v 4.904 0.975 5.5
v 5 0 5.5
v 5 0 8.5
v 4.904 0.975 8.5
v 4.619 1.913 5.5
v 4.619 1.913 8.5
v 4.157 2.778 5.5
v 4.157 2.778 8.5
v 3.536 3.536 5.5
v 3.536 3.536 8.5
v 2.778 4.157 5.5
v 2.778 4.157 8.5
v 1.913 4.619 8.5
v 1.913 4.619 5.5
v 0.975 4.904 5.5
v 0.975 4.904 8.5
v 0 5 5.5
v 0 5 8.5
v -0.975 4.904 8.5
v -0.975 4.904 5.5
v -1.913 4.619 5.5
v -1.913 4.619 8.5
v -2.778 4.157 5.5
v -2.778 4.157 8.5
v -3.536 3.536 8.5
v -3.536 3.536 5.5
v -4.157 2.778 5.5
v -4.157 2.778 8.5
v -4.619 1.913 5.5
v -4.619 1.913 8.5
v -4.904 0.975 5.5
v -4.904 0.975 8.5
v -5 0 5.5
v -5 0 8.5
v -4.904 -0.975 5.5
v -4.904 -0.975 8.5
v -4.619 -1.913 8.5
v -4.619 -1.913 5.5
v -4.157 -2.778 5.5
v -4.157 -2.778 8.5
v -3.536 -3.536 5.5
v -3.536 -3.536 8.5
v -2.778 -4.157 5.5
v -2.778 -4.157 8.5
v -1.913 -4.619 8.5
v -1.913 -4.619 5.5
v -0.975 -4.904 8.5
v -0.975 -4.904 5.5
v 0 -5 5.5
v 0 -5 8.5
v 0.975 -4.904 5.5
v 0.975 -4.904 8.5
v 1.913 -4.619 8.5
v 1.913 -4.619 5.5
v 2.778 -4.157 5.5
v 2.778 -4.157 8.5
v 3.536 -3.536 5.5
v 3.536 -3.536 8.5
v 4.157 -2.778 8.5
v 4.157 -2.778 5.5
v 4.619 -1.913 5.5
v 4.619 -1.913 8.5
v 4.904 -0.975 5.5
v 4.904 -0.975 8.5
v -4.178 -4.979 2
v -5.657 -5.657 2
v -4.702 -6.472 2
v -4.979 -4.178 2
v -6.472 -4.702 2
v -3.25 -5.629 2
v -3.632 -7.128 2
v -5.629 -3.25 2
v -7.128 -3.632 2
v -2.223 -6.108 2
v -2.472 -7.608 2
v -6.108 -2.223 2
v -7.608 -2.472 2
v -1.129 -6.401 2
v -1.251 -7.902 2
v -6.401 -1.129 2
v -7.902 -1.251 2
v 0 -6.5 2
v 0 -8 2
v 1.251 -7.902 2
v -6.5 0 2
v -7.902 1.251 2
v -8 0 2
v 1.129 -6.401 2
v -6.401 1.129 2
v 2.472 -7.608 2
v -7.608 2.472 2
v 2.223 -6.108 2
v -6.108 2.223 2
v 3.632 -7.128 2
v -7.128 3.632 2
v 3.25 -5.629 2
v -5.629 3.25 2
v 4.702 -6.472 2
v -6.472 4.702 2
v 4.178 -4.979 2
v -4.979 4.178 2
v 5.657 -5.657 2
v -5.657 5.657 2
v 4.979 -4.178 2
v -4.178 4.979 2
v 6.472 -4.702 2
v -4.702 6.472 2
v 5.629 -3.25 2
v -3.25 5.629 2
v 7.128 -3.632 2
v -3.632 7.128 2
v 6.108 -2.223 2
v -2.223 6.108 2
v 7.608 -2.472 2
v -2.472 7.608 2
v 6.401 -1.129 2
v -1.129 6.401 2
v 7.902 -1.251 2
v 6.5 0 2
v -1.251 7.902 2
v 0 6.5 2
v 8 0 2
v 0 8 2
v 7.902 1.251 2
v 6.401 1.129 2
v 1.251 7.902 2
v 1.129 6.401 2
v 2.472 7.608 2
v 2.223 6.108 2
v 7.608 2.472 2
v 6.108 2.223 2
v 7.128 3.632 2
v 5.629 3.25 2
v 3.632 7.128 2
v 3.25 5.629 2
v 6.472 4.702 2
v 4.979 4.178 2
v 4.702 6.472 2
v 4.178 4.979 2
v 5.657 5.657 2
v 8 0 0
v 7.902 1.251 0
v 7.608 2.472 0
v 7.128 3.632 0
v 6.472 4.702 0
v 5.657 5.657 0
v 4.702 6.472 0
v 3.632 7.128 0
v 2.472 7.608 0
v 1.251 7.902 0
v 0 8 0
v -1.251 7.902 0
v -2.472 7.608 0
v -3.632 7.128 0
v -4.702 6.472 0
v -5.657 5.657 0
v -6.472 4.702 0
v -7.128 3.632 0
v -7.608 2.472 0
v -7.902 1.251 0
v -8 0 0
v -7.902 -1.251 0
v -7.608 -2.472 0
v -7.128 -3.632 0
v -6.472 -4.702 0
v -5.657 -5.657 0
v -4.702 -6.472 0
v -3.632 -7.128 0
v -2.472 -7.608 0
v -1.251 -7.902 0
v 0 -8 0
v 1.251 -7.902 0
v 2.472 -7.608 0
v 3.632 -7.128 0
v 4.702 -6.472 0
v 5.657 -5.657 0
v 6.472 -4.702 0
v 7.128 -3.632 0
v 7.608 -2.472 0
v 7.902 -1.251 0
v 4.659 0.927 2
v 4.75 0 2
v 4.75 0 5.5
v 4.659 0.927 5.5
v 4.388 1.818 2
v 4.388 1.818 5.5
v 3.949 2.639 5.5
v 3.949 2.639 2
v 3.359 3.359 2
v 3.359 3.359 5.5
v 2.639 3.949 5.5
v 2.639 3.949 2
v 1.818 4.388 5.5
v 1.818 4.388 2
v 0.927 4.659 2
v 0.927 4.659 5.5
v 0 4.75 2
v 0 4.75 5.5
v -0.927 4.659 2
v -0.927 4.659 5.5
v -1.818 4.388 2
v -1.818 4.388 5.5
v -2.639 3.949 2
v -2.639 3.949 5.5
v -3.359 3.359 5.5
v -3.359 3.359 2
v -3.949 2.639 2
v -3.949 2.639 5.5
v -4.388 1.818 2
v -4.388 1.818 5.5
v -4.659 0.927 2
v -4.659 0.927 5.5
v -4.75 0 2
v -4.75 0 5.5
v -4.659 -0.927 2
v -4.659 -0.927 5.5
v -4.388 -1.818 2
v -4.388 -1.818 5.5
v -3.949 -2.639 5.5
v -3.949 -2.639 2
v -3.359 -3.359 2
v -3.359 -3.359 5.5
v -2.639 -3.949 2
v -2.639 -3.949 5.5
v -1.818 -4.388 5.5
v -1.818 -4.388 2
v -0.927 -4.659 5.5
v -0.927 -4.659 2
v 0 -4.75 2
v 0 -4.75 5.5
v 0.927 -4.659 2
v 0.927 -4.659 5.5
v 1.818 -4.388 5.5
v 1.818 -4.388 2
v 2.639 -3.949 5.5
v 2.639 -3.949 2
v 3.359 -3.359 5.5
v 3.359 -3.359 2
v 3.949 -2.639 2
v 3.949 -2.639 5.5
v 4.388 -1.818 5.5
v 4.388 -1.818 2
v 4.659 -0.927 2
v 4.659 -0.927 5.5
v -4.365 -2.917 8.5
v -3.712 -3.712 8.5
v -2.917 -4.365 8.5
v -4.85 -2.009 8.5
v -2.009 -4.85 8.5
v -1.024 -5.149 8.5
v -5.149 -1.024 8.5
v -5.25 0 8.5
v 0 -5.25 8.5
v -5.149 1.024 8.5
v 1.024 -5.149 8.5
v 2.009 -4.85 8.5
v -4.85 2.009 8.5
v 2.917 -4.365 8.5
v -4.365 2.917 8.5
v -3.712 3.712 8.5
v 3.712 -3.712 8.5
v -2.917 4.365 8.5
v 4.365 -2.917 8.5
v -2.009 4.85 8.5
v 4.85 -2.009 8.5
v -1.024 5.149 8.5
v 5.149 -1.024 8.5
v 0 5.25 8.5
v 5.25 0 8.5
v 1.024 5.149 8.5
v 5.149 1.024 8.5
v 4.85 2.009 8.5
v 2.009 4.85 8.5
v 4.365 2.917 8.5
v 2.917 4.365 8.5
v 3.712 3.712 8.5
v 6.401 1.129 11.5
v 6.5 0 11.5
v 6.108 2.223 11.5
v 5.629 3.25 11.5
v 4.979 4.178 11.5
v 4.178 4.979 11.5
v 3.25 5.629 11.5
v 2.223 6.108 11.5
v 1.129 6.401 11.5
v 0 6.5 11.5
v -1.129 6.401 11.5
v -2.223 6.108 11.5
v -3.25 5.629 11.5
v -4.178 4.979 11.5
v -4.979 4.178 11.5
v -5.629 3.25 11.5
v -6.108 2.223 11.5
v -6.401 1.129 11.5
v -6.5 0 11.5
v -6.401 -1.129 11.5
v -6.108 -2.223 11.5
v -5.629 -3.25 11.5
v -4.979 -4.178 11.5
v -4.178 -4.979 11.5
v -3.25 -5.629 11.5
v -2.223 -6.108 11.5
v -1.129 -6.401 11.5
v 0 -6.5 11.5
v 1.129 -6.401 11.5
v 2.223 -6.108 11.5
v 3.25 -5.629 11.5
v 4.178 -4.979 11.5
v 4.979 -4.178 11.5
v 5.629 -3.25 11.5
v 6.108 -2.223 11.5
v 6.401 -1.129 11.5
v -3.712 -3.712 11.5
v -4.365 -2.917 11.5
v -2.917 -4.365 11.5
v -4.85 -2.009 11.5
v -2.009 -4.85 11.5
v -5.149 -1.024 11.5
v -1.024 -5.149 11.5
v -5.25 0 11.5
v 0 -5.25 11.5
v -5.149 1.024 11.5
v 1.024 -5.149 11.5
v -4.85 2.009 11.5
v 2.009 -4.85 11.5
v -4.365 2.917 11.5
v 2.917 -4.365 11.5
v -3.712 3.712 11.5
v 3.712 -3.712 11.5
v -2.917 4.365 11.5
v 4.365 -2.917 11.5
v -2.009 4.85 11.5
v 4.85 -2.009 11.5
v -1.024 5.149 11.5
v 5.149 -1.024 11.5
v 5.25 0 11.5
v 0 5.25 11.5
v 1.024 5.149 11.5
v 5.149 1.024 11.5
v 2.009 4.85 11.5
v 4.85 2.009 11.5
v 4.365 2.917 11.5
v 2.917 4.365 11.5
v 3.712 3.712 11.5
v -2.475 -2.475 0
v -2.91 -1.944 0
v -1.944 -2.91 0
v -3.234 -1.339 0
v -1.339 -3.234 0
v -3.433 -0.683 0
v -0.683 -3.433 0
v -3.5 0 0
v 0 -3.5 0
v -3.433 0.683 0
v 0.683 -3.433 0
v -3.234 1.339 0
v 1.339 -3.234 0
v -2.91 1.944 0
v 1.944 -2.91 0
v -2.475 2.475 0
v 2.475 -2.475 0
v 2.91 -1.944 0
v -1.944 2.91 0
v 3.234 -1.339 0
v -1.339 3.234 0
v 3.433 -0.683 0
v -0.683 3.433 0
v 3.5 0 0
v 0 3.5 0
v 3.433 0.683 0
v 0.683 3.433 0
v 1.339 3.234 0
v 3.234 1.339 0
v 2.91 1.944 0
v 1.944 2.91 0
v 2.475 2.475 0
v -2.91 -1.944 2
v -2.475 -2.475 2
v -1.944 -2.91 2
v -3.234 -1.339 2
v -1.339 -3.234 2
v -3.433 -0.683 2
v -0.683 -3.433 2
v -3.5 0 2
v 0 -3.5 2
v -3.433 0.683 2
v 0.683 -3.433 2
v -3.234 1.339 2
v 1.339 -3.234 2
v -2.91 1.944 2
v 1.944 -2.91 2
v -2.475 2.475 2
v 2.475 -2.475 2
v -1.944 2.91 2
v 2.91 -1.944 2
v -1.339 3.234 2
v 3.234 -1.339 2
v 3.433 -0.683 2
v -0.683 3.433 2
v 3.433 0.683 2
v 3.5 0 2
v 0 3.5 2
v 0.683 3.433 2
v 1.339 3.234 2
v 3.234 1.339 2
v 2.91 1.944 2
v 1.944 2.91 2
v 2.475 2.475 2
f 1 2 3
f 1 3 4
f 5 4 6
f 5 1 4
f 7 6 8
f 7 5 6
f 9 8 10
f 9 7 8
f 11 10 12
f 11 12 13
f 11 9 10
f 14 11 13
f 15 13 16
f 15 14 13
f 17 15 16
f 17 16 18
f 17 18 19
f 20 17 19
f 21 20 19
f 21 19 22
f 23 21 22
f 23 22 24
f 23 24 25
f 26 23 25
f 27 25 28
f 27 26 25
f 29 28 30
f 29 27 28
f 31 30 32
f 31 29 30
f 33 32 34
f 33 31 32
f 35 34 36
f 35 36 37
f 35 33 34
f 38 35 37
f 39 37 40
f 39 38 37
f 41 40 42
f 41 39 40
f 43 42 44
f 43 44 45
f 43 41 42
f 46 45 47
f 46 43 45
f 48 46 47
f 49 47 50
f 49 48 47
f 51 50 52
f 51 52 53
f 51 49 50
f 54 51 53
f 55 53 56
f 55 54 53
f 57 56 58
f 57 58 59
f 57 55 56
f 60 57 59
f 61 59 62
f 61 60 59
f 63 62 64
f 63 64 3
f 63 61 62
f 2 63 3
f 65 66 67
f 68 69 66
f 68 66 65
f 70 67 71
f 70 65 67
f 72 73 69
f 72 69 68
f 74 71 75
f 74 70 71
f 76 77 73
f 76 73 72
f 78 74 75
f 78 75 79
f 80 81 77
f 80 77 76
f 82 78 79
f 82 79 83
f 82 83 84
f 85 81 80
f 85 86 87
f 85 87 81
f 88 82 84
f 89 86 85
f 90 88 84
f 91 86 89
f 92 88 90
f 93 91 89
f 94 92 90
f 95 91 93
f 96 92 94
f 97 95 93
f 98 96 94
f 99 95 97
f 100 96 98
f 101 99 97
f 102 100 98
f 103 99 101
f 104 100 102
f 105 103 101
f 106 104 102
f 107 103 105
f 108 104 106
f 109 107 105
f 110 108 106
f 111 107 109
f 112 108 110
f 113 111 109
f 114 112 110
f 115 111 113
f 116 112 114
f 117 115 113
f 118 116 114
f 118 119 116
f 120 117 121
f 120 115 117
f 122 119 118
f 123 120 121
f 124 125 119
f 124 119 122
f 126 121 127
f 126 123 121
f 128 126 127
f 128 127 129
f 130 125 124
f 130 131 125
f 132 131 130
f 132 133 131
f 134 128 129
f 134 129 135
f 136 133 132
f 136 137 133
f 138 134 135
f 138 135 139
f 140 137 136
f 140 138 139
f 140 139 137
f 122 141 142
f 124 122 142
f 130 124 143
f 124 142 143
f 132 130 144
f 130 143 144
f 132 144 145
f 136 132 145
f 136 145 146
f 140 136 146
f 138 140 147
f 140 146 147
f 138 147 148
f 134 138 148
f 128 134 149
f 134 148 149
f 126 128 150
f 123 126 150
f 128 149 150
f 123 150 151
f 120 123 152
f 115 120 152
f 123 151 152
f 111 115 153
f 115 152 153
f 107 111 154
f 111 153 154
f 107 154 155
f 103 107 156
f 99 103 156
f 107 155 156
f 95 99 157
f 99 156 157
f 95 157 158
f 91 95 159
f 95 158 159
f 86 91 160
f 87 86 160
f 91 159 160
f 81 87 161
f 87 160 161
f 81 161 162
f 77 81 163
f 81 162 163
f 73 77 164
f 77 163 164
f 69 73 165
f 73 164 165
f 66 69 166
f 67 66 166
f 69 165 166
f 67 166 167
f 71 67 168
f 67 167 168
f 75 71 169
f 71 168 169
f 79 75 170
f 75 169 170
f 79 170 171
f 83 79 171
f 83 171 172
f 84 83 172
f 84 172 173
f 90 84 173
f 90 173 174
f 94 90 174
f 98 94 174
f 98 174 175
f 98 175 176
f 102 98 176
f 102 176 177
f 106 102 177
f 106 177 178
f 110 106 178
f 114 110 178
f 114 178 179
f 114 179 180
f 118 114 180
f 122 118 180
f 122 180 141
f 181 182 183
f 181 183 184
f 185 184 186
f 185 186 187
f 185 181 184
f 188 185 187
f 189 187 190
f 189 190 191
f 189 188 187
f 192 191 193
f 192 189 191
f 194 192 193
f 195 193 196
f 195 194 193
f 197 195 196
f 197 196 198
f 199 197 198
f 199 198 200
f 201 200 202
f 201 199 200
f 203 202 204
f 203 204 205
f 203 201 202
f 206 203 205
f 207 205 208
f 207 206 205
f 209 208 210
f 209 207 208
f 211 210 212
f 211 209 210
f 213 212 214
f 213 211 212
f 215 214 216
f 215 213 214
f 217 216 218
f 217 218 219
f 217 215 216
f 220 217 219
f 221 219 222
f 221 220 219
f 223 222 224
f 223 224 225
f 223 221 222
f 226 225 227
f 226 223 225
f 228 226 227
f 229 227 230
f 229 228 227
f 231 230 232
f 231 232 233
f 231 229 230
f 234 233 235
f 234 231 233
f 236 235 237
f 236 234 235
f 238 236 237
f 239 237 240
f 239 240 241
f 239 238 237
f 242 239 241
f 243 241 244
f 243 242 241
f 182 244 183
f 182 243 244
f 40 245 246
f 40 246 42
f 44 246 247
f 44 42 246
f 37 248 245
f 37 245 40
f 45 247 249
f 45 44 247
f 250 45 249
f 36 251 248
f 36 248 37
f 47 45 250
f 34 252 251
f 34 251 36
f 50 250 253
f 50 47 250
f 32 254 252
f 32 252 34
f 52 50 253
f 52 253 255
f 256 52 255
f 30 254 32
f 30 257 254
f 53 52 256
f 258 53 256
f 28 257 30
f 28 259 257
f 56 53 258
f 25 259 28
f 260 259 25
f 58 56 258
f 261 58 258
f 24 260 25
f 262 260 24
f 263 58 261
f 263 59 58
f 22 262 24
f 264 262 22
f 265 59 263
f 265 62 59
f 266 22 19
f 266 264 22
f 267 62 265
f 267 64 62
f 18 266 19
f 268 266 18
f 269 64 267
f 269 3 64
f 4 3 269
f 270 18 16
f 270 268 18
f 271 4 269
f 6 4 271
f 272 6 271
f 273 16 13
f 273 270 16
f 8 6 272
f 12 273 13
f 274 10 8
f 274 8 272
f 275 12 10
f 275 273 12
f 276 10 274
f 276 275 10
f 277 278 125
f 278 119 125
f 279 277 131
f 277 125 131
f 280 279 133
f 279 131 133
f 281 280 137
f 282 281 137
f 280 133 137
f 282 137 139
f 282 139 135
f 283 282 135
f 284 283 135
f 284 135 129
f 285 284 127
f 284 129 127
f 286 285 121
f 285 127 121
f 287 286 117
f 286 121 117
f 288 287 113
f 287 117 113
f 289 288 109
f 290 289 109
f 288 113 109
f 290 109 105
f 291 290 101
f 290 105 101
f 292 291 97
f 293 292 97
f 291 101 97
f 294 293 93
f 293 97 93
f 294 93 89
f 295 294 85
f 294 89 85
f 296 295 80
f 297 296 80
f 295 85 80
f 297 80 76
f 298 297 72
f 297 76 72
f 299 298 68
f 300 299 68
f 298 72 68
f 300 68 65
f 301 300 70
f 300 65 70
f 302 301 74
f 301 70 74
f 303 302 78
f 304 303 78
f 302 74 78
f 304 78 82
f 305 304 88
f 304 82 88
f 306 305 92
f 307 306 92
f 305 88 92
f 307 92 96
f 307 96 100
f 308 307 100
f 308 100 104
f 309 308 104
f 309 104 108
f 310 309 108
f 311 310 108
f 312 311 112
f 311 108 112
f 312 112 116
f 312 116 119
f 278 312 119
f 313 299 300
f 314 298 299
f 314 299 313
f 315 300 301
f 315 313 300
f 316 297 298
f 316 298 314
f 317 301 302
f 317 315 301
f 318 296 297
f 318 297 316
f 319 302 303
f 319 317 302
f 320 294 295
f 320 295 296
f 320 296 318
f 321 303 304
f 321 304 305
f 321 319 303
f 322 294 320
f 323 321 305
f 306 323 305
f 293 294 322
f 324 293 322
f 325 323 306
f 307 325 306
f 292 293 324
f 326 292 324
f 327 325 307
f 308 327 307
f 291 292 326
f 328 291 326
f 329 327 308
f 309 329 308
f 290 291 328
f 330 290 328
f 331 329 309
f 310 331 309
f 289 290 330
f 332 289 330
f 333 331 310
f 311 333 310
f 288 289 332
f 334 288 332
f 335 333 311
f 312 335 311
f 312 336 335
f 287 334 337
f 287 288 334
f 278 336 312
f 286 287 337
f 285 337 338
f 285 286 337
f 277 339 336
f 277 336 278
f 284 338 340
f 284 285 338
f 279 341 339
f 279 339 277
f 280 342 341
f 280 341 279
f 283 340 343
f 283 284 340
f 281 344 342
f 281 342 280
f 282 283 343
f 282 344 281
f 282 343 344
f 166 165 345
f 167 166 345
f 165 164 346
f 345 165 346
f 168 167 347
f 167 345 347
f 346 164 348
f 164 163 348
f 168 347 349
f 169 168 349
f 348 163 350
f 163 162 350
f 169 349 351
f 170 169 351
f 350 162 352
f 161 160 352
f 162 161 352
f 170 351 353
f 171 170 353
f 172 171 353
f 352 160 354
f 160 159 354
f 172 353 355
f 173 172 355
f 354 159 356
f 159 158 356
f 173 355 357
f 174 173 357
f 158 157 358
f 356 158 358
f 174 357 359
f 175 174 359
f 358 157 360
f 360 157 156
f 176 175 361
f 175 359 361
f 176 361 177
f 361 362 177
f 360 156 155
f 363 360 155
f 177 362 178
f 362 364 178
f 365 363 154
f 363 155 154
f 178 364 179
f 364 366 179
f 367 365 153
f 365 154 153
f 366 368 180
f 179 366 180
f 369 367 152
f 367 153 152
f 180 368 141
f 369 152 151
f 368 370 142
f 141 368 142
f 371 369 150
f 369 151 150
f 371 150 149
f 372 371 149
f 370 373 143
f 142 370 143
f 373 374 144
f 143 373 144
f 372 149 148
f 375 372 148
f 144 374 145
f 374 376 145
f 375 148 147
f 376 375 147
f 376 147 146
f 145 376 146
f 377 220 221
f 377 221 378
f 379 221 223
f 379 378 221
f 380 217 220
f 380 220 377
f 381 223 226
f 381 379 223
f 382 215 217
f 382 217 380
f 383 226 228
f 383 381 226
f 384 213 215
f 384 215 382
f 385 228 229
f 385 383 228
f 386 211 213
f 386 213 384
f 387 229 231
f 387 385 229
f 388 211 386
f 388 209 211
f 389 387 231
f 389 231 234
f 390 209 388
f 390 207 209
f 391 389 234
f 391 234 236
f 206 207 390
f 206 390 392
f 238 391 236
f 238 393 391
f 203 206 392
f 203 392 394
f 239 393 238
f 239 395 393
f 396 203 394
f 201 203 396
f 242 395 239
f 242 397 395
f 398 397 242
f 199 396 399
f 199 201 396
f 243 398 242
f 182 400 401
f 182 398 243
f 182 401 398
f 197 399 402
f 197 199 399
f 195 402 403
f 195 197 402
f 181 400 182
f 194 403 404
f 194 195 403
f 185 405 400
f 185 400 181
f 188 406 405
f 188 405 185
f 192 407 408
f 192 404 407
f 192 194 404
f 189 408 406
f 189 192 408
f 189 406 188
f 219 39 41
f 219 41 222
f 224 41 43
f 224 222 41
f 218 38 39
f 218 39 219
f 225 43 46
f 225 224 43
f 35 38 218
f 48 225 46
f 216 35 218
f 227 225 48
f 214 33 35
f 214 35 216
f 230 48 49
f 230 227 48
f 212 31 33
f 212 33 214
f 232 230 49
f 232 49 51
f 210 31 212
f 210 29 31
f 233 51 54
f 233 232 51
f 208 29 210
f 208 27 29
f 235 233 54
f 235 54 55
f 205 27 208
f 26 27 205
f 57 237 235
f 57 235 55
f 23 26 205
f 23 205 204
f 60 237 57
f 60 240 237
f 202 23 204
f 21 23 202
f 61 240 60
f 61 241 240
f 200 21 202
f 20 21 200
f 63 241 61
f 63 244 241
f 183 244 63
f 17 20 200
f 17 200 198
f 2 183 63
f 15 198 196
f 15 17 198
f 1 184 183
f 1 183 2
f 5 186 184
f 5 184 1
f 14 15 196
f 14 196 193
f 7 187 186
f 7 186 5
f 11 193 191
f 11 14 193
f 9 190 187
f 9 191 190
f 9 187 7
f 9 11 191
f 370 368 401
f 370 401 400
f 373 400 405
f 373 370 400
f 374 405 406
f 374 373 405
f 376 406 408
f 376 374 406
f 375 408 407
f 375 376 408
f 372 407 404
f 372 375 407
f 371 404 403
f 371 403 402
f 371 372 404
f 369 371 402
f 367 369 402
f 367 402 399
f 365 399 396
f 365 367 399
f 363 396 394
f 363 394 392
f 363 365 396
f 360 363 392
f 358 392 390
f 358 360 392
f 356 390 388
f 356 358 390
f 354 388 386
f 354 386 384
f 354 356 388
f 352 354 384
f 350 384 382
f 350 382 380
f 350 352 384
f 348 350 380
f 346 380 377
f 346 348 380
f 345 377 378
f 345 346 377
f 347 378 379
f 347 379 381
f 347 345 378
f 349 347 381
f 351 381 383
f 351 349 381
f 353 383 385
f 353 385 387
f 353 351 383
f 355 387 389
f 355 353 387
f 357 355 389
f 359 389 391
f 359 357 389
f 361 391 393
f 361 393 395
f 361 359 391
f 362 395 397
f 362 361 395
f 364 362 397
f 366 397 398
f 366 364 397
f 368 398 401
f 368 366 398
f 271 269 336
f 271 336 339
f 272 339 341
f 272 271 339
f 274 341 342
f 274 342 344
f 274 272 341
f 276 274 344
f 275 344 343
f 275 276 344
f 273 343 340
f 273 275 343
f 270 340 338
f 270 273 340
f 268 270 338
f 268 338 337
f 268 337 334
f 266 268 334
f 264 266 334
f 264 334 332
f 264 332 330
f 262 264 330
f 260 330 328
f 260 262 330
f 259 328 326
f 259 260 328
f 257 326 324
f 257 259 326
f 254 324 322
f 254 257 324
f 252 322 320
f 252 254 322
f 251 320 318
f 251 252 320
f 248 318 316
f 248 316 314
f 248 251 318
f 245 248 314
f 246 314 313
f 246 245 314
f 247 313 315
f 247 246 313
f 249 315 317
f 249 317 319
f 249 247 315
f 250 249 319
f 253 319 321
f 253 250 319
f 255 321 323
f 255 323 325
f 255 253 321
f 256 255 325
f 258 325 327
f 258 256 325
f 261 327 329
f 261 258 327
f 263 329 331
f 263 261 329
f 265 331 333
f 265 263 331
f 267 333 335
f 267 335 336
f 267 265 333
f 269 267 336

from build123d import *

# Parameters (mm, degrees)
F0_R     = 8
F0_R_2   = 3.5
F1_DEPTH = 2
F2_R     = 6.5
F2_R_2   = 4.75
F3_DEPTH = 3.5
F4_R     = 6.5
F4_R_2   = 5
F5_DEPTH = 3
F6_R     = 6.5
F6_R_2   = 5.25
F7_DEPTH = 3


with BuildPart() as f1:
    # F0 (on Top) → F1 (new body)
    with BuildSketch(Plane.XY):
        Circle(F0_R)
        Circle(F0_R_2, mode=Mode.SUBTRACT)
    extrude(amount=F1_DEPTH)

    # F2 (on face) → F3 (join)
    with BuildSketch(Plane.XY.offset(2)):
        Circle(F2_R)
        Circle(F2_R_2, mode=Mode.SUBTRACT)
    extrude(amount=F3_DEPTH)

    # F4 (on face) → F5 (join)
    with BuildSketch(Plane.XY.offset(5.5)):
        Circle(F4_R)
        Circle(F4_R_2, mode=Mode.SUBTRACT)
    extrude(amount=F5_DEPTH)

    # F6 (on face) → F7 (join)
    with BuildSketch(Plane.XY.offset(8.5)):
        Circle(F6_R)
        Circle(F6_R_2, mode=Mode.SUBTRACT)
    extrude(amount=F7_DEPTH)


solid = f1.part
